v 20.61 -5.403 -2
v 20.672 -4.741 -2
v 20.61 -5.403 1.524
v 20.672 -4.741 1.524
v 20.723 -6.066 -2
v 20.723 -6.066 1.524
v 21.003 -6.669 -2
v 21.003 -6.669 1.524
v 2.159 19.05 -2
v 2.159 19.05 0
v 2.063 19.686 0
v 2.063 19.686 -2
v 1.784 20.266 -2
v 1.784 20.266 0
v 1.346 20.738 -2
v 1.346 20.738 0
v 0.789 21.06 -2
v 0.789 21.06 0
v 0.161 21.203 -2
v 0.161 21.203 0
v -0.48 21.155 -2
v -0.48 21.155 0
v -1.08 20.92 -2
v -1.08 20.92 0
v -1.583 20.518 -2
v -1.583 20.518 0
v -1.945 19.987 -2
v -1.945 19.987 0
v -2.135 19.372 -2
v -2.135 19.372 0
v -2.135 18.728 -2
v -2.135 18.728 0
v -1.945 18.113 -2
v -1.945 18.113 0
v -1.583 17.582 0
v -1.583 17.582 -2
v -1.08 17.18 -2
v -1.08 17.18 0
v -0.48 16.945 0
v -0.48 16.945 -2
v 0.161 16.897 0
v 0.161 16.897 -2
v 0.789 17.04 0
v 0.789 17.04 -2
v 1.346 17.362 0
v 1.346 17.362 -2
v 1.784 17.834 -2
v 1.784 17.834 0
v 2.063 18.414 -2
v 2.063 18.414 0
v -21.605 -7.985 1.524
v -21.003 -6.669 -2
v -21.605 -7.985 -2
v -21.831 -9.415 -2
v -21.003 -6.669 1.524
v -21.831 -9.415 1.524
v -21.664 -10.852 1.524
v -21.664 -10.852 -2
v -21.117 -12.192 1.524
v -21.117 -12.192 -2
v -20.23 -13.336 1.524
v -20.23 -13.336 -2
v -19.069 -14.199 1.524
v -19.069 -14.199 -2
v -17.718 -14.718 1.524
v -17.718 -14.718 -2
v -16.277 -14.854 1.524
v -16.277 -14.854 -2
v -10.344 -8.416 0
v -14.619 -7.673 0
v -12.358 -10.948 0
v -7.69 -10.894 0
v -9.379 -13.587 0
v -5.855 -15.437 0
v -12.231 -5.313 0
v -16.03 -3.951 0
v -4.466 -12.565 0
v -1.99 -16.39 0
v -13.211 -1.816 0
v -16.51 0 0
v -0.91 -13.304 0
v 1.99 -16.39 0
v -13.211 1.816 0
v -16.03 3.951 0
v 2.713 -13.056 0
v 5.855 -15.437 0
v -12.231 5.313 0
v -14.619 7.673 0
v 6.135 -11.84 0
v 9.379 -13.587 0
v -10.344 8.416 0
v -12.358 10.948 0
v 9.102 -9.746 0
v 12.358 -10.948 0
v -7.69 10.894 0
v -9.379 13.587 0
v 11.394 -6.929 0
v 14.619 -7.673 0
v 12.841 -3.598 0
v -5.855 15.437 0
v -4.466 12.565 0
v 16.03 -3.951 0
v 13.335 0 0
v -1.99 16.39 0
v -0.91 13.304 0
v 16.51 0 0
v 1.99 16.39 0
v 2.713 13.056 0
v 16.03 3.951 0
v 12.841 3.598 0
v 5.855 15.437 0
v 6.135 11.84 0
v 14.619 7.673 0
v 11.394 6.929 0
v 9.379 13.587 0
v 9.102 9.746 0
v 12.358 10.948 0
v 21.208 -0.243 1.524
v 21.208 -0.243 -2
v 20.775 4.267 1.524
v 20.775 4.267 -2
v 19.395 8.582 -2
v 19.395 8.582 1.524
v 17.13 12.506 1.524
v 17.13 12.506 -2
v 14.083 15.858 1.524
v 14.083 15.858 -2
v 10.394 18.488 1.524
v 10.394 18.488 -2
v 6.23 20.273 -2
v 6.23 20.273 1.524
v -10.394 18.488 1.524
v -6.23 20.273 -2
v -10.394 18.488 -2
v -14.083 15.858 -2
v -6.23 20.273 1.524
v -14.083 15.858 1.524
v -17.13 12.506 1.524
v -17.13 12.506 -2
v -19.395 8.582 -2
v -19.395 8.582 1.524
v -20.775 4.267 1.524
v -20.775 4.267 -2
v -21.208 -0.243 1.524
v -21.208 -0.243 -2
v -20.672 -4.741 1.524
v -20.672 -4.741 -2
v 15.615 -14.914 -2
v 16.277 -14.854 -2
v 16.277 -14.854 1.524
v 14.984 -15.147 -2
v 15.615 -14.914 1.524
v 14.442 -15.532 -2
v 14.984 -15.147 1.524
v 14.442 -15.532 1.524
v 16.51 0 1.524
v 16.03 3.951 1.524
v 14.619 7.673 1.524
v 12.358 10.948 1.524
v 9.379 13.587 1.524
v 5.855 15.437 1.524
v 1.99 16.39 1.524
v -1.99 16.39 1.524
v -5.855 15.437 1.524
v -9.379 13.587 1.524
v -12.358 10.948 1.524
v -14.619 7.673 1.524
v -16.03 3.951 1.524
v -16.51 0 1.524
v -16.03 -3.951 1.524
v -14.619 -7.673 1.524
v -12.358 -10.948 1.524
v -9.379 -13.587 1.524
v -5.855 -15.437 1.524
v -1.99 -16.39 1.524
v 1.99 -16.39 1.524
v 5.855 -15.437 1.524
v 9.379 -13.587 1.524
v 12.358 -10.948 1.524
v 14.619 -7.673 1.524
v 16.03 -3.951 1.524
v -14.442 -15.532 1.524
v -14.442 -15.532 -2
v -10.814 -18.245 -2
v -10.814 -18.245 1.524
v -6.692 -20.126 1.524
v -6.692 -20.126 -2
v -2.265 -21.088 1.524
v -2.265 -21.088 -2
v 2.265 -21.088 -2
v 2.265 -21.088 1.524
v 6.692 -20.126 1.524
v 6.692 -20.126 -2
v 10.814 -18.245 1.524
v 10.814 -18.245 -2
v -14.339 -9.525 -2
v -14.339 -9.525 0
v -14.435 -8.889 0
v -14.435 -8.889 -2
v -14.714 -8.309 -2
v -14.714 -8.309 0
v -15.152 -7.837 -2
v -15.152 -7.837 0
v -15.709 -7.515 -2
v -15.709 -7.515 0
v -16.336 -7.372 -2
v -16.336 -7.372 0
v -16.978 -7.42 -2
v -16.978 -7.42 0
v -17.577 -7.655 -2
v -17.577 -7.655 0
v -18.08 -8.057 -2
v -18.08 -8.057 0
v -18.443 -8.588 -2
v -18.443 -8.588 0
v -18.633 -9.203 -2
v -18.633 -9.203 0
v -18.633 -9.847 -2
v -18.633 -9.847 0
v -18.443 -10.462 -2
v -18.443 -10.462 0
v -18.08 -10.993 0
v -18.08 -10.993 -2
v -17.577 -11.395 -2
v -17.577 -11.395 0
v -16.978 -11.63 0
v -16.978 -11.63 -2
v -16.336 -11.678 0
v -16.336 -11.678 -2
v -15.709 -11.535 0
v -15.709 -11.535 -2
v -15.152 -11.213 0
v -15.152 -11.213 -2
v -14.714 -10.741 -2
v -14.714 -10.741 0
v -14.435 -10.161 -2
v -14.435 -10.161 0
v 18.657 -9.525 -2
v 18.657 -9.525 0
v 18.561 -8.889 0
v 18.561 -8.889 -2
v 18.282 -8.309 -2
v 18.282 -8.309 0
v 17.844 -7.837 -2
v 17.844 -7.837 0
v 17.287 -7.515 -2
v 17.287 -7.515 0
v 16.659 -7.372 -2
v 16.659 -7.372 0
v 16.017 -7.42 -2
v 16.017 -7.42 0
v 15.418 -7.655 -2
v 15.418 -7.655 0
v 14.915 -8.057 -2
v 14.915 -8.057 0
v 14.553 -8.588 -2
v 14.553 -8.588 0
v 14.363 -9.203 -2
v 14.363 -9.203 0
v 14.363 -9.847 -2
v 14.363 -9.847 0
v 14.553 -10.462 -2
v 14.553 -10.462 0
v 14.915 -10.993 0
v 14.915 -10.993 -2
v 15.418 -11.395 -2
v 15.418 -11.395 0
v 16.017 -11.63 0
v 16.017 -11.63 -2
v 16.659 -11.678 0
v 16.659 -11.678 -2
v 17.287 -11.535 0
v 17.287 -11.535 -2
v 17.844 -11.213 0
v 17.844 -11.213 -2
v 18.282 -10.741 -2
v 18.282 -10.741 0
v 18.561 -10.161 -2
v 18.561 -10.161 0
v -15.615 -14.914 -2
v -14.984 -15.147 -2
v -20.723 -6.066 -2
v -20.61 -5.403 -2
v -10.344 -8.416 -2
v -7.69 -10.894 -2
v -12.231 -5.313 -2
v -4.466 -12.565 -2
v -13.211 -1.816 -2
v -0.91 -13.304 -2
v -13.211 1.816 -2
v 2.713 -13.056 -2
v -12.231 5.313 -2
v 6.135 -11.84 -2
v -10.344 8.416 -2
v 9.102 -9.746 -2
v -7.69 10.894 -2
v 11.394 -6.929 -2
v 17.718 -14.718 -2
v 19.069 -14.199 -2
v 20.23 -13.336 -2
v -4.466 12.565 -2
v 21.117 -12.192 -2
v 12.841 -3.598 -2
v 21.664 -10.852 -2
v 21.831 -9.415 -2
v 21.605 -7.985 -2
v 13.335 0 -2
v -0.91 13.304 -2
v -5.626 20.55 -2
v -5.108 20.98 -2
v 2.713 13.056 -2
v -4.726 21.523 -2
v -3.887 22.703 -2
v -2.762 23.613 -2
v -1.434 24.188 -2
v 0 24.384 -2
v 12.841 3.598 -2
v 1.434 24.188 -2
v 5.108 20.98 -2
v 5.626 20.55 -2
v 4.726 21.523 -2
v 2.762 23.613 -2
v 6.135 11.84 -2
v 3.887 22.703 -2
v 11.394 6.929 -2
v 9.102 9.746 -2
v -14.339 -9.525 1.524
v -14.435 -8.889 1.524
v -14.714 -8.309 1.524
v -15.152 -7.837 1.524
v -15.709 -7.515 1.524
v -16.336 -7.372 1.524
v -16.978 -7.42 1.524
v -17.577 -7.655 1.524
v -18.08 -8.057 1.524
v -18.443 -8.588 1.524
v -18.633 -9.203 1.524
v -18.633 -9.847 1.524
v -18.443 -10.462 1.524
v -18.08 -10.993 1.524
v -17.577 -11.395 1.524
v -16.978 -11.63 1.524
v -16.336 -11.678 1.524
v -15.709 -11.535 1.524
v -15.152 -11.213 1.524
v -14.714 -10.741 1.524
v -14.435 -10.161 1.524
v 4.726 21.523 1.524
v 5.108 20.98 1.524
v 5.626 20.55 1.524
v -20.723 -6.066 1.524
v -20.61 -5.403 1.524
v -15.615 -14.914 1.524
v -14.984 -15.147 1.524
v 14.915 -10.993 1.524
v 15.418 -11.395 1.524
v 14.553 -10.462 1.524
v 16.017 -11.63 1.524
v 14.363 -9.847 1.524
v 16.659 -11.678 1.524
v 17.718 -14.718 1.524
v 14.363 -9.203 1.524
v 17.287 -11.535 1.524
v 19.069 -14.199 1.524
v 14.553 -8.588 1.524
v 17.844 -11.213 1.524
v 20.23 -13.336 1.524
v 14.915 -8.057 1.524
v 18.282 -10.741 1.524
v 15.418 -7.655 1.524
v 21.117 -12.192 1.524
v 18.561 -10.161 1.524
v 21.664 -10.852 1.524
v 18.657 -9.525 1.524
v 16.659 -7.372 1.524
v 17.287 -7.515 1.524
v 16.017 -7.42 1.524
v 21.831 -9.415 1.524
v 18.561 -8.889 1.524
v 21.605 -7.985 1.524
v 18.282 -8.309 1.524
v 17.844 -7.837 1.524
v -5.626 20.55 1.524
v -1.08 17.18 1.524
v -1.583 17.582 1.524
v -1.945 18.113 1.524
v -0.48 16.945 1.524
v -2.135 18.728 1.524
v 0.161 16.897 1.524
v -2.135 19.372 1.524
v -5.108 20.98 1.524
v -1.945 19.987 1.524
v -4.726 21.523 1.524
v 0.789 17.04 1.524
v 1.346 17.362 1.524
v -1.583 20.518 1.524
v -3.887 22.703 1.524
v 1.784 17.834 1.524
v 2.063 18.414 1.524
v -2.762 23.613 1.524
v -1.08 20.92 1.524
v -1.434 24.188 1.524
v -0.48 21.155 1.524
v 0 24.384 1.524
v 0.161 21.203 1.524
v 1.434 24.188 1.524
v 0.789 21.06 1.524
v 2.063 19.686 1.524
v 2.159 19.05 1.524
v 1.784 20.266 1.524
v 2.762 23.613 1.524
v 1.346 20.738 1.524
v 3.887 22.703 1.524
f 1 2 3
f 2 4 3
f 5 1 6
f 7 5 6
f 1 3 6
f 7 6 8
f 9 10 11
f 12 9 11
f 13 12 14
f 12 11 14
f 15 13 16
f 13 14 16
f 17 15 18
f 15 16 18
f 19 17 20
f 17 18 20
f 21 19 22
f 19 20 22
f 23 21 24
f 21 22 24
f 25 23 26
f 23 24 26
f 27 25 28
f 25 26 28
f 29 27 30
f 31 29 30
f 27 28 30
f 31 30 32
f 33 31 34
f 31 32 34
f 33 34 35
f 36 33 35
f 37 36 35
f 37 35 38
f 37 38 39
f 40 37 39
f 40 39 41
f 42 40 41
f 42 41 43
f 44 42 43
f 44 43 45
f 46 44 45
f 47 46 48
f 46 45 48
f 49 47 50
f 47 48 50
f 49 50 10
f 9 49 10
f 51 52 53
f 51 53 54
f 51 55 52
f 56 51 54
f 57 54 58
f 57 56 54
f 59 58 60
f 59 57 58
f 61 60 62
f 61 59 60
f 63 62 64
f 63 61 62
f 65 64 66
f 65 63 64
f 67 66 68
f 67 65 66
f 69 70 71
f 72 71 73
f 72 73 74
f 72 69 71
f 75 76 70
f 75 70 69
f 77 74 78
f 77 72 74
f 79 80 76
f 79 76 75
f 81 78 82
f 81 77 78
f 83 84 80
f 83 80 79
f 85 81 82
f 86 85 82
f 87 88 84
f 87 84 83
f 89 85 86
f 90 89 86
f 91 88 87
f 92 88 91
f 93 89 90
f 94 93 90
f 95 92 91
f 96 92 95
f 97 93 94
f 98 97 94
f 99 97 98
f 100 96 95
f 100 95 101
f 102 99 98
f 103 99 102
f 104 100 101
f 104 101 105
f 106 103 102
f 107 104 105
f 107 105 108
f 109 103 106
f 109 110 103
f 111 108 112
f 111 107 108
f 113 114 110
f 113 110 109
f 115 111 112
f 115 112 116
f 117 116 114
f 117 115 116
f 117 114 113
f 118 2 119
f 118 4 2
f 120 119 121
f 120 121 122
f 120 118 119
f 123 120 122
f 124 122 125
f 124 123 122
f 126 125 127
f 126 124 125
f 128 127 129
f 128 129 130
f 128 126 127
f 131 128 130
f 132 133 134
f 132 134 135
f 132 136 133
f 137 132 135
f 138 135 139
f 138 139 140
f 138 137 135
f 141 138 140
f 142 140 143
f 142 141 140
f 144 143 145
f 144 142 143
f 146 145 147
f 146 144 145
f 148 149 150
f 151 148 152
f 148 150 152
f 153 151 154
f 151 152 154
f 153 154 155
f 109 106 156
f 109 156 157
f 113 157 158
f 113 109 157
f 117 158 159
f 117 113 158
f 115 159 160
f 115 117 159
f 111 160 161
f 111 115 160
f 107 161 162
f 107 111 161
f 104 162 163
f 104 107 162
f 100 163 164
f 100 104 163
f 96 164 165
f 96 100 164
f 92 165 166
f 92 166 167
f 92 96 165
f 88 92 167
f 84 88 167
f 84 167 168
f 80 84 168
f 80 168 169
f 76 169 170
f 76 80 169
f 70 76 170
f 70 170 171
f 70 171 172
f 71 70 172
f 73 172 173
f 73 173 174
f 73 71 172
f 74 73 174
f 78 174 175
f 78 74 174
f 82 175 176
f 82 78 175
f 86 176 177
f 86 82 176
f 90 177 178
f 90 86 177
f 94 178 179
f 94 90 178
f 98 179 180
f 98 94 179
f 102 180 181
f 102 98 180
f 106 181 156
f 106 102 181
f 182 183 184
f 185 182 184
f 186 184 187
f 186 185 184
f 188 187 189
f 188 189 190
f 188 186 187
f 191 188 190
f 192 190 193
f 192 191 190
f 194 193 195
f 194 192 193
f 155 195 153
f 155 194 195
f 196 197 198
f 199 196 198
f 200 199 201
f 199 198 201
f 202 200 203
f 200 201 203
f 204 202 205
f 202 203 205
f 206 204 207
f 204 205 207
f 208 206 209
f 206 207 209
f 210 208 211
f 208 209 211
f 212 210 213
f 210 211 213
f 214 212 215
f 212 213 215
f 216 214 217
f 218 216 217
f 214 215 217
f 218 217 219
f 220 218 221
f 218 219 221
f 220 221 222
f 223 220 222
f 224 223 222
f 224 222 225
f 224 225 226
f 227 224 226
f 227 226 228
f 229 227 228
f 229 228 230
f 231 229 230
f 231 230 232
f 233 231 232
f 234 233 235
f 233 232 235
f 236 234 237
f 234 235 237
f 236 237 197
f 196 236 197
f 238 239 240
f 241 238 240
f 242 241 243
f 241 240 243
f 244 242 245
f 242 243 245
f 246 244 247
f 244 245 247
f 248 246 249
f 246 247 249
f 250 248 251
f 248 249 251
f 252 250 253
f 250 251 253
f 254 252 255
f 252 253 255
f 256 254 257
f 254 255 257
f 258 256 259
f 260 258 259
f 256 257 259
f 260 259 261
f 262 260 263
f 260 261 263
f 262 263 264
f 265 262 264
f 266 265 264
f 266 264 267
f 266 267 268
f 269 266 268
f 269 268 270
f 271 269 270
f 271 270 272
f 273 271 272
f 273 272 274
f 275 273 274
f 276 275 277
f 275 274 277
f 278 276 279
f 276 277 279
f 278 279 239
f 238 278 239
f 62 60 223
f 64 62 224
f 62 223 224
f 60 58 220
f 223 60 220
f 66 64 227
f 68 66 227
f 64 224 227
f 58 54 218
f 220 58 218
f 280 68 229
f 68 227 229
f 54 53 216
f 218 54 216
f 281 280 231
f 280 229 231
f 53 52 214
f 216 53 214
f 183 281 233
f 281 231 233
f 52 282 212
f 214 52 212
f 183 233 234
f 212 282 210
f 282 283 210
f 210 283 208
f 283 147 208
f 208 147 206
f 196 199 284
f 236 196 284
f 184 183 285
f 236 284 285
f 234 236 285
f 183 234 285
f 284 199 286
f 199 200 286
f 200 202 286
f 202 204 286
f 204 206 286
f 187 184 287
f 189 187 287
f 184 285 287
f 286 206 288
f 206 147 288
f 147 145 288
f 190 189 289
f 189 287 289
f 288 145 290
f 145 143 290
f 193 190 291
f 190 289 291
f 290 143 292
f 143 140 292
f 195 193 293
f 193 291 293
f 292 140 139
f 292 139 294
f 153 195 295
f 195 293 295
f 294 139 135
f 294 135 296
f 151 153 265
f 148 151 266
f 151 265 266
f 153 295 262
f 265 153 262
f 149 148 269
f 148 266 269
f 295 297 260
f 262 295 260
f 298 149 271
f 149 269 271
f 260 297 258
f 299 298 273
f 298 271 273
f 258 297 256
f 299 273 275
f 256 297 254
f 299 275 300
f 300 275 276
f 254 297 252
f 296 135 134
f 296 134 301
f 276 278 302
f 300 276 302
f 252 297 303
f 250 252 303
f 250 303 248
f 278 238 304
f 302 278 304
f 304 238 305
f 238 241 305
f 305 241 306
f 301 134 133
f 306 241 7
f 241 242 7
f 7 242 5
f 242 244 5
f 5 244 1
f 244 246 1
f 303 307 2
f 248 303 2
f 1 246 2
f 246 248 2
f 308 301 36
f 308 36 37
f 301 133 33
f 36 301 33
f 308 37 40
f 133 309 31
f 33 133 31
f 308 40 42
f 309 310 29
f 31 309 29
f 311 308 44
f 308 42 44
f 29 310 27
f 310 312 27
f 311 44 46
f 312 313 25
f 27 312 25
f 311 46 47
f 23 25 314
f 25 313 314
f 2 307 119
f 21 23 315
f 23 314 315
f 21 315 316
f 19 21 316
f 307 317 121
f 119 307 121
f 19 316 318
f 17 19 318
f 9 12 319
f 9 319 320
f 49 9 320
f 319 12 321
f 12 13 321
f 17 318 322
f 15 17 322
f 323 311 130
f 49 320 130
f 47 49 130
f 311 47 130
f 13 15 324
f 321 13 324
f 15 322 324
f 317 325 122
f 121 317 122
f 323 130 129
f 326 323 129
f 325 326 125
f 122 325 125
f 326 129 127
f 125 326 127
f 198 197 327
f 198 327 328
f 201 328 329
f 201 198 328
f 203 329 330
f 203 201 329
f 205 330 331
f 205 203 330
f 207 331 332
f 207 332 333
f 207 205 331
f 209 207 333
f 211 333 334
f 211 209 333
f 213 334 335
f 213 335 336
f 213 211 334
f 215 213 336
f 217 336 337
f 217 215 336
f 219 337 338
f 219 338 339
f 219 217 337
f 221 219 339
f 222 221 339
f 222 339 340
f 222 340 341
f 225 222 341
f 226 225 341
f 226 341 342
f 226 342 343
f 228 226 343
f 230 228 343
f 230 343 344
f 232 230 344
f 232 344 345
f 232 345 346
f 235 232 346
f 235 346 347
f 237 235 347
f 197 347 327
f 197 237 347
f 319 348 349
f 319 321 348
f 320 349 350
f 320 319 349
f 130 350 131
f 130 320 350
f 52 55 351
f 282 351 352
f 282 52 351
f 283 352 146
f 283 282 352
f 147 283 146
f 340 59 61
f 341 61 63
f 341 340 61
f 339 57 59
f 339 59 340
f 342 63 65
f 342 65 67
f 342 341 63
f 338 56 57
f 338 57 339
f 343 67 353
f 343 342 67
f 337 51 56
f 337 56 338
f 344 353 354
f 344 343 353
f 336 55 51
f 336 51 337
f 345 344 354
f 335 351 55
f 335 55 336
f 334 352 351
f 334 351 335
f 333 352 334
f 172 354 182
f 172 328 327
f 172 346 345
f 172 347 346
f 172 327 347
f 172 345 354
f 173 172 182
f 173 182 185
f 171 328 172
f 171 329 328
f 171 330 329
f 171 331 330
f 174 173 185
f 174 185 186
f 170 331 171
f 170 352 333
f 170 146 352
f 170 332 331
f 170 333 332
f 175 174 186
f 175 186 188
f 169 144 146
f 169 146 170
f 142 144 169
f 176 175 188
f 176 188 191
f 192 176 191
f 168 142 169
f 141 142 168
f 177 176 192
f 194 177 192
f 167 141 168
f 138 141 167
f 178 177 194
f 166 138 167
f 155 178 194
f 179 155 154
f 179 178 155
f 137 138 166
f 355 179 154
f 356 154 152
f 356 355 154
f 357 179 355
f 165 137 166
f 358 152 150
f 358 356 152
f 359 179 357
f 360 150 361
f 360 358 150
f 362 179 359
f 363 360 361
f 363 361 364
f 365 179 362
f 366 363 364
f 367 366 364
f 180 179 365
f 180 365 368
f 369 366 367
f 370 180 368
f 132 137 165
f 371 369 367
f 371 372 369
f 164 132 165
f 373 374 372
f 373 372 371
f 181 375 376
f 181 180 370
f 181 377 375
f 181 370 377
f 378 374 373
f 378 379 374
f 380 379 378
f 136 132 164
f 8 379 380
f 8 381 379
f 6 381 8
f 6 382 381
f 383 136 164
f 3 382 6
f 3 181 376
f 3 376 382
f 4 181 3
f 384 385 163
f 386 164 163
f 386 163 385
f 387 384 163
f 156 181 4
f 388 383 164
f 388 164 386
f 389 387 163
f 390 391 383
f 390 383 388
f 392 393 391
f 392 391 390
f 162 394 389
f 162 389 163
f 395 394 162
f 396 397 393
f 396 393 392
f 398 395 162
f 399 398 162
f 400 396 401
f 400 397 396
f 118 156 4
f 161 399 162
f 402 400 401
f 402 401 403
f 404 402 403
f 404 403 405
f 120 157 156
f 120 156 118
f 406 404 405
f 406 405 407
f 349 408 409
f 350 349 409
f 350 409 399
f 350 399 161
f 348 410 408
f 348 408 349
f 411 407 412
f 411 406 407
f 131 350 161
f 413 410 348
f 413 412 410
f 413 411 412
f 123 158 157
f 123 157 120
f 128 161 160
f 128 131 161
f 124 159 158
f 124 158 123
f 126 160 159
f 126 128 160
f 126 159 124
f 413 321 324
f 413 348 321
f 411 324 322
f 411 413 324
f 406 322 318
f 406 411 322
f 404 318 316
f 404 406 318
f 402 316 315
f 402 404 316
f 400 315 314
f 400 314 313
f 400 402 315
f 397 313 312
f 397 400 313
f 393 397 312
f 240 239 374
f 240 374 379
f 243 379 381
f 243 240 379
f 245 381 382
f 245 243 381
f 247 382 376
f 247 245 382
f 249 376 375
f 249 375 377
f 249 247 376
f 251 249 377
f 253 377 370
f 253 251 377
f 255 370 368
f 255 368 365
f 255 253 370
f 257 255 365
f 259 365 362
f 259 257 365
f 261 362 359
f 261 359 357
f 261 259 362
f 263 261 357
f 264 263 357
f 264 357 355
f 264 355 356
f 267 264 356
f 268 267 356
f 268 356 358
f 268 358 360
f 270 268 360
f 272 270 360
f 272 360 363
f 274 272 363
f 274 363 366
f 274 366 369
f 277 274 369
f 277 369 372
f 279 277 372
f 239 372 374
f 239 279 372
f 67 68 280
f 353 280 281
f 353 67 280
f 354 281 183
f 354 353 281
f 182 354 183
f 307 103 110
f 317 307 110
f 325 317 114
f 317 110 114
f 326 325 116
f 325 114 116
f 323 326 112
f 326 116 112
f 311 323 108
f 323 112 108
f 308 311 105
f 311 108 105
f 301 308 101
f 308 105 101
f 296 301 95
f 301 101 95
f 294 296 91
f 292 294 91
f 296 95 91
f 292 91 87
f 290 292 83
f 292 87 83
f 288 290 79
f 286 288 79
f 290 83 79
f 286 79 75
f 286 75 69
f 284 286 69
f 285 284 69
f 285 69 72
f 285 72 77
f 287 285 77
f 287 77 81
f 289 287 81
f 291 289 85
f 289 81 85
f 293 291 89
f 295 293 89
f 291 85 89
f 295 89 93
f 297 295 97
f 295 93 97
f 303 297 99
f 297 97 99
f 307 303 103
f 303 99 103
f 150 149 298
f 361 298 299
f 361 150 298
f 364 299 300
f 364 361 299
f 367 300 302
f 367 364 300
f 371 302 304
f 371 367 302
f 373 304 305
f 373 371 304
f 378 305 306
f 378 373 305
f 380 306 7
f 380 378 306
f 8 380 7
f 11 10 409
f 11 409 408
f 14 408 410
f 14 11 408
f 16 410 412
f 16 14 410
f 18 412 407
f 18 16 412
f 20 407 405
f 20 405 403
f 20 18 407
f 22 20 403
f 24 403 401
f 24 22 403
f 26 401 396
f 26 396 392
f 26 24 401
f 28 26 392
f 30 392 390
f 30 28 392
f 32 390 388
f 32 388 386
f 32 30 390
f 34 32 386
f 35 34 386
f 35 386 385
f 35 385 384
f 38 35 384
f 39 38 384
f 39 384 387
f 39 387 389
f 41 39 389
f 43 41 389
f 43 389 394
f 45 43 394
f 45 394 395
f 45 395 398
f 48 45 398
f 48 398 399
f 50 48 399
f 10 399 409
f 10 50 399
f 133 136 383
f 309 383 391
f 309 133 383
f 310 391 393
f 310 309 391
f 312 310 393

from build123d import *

# Parameters (mm, degrees)
SKETCH1_R           = 2.159
SKETCH1_R_2         = 16.51
BOSS_EXTRUDE1_DEPTH = 1.524
SKETCH2_R           = 2.159
SKETCH2_R_2         = 13.335
BOSS_EXTRUDE2_DEPTH = 2
FILLET1_R           = 2.54


with BuildPart() as part:
    # Sketch1 → Boss-Extrude1 (new body)
    with BuildSketch(Plane.XY):
        with BuildLine():
            ThreePointArc((15.272530034, -14.716368688), (21.117163446, -12.192), (20.381014152, -5.868214645))
            ThreePointArc((20.381014152, -5.868214645), (18.367532789, 10.6045), (5.108484119, 20.584583333))
            ThreePointArc((5.108484119, 20.584583333), (0, 24.384), (-5.108484119, 20.584583333))
            ThreePointArc((-5.108484119, 20.584583333), (-18.367532789, 10.6045), (-20.381014152, -5.868214645))
            ThreePointArc((-20.381014152, -5.868214645), (-21.117163446, -12.192), (-15.272530034, -14.716368688))
            ThreePointArc((-15.272530034, -14.716368688), (0, -21.209), (15.272530034, -14.716368688))
        make_face()
        with Locations((0, 19.05)):
            Circle(SKETCH1_R, mode=Mode.SUBTRACT)
        with Locations((16.497783942, -9.525)):
            Circle(SKETCH1_R, mode=Mode.SUBTRACT)
        with Locations((-16.497783942, -9.525)):
            Circle(SKETCH1_R, mode=Mode.SUBTRACT)
        Circle(SKETCH1_R_2, mode=Mode.SUBTRACT)
    extrude(amount=BOSS_EXTRUDE1_DEPTH)

    # Sketch2 → Boss-Extrude2 (add)
    with BuildSketch(Plane.XY):
        with BuildLine():
            ThreePointArc((-20.381014152, -5.868214645), (-21.117163446, -12.192), (-15.272530034, -14.716368688))
            ThreePointArc((-15.272530034, -14.716368688), (0, -21.209), (15.272530034, -14.716368688))
            ThreePointArc((15.272530034, -14.716368688), (21.117163446, -12.192), (20.381014152, -5.868214645))
            ThreePointArc((20.381014152, -5.868214645), (18.367532789, 10.6045), (5.108484119, 20.584583333))
            ThreePointArc((5.108484119, 20.584583333), (0, 24.384), (-5.108484119, 20.584583333))
            ThreePointArc((-5.108484119, 20.584583333), (-18.367532789, 10.6045), (-20.381014152, -5.868214645))
        make_face()
        with Locations((0, 19.05)):
            Circle(SKETCH2_R, mode=Mode.SUBTRACT)
        with Locations((-16.497783942, -9.525)):
            Circle(SKETCH2_R, mode=Mode.SUBTRACT)
        Circle(SKETCH2_R_2, mode=Mode.SUBTRACT)
        with Locations((16.497783942, -9.525)):
            Circle(SKETCH2_R, mode=Mode.SUBTRACT)
    extrude(amount=-BOSS_EXTRUDE2_DEPTH)

    # Fillet1
    fillet1_edges = [part.edges().sort_by_distance(p)[0] for p in [
        (15.272530034, -14.716368688, -0.238),
        (-15.272530034, -14.716368688, -0.238),
        (-20.381014152, -5.868214645, -0.238),
        (-5.108484119, 20.584583333, -0.238),
        (5.108484119, 20.584583333, -0.238),
        (20.381014152, -5.868214645, -0.238),
    ]]
    fillet(fillet1_edges, radius=FILLET1_R)


solid = part.part
